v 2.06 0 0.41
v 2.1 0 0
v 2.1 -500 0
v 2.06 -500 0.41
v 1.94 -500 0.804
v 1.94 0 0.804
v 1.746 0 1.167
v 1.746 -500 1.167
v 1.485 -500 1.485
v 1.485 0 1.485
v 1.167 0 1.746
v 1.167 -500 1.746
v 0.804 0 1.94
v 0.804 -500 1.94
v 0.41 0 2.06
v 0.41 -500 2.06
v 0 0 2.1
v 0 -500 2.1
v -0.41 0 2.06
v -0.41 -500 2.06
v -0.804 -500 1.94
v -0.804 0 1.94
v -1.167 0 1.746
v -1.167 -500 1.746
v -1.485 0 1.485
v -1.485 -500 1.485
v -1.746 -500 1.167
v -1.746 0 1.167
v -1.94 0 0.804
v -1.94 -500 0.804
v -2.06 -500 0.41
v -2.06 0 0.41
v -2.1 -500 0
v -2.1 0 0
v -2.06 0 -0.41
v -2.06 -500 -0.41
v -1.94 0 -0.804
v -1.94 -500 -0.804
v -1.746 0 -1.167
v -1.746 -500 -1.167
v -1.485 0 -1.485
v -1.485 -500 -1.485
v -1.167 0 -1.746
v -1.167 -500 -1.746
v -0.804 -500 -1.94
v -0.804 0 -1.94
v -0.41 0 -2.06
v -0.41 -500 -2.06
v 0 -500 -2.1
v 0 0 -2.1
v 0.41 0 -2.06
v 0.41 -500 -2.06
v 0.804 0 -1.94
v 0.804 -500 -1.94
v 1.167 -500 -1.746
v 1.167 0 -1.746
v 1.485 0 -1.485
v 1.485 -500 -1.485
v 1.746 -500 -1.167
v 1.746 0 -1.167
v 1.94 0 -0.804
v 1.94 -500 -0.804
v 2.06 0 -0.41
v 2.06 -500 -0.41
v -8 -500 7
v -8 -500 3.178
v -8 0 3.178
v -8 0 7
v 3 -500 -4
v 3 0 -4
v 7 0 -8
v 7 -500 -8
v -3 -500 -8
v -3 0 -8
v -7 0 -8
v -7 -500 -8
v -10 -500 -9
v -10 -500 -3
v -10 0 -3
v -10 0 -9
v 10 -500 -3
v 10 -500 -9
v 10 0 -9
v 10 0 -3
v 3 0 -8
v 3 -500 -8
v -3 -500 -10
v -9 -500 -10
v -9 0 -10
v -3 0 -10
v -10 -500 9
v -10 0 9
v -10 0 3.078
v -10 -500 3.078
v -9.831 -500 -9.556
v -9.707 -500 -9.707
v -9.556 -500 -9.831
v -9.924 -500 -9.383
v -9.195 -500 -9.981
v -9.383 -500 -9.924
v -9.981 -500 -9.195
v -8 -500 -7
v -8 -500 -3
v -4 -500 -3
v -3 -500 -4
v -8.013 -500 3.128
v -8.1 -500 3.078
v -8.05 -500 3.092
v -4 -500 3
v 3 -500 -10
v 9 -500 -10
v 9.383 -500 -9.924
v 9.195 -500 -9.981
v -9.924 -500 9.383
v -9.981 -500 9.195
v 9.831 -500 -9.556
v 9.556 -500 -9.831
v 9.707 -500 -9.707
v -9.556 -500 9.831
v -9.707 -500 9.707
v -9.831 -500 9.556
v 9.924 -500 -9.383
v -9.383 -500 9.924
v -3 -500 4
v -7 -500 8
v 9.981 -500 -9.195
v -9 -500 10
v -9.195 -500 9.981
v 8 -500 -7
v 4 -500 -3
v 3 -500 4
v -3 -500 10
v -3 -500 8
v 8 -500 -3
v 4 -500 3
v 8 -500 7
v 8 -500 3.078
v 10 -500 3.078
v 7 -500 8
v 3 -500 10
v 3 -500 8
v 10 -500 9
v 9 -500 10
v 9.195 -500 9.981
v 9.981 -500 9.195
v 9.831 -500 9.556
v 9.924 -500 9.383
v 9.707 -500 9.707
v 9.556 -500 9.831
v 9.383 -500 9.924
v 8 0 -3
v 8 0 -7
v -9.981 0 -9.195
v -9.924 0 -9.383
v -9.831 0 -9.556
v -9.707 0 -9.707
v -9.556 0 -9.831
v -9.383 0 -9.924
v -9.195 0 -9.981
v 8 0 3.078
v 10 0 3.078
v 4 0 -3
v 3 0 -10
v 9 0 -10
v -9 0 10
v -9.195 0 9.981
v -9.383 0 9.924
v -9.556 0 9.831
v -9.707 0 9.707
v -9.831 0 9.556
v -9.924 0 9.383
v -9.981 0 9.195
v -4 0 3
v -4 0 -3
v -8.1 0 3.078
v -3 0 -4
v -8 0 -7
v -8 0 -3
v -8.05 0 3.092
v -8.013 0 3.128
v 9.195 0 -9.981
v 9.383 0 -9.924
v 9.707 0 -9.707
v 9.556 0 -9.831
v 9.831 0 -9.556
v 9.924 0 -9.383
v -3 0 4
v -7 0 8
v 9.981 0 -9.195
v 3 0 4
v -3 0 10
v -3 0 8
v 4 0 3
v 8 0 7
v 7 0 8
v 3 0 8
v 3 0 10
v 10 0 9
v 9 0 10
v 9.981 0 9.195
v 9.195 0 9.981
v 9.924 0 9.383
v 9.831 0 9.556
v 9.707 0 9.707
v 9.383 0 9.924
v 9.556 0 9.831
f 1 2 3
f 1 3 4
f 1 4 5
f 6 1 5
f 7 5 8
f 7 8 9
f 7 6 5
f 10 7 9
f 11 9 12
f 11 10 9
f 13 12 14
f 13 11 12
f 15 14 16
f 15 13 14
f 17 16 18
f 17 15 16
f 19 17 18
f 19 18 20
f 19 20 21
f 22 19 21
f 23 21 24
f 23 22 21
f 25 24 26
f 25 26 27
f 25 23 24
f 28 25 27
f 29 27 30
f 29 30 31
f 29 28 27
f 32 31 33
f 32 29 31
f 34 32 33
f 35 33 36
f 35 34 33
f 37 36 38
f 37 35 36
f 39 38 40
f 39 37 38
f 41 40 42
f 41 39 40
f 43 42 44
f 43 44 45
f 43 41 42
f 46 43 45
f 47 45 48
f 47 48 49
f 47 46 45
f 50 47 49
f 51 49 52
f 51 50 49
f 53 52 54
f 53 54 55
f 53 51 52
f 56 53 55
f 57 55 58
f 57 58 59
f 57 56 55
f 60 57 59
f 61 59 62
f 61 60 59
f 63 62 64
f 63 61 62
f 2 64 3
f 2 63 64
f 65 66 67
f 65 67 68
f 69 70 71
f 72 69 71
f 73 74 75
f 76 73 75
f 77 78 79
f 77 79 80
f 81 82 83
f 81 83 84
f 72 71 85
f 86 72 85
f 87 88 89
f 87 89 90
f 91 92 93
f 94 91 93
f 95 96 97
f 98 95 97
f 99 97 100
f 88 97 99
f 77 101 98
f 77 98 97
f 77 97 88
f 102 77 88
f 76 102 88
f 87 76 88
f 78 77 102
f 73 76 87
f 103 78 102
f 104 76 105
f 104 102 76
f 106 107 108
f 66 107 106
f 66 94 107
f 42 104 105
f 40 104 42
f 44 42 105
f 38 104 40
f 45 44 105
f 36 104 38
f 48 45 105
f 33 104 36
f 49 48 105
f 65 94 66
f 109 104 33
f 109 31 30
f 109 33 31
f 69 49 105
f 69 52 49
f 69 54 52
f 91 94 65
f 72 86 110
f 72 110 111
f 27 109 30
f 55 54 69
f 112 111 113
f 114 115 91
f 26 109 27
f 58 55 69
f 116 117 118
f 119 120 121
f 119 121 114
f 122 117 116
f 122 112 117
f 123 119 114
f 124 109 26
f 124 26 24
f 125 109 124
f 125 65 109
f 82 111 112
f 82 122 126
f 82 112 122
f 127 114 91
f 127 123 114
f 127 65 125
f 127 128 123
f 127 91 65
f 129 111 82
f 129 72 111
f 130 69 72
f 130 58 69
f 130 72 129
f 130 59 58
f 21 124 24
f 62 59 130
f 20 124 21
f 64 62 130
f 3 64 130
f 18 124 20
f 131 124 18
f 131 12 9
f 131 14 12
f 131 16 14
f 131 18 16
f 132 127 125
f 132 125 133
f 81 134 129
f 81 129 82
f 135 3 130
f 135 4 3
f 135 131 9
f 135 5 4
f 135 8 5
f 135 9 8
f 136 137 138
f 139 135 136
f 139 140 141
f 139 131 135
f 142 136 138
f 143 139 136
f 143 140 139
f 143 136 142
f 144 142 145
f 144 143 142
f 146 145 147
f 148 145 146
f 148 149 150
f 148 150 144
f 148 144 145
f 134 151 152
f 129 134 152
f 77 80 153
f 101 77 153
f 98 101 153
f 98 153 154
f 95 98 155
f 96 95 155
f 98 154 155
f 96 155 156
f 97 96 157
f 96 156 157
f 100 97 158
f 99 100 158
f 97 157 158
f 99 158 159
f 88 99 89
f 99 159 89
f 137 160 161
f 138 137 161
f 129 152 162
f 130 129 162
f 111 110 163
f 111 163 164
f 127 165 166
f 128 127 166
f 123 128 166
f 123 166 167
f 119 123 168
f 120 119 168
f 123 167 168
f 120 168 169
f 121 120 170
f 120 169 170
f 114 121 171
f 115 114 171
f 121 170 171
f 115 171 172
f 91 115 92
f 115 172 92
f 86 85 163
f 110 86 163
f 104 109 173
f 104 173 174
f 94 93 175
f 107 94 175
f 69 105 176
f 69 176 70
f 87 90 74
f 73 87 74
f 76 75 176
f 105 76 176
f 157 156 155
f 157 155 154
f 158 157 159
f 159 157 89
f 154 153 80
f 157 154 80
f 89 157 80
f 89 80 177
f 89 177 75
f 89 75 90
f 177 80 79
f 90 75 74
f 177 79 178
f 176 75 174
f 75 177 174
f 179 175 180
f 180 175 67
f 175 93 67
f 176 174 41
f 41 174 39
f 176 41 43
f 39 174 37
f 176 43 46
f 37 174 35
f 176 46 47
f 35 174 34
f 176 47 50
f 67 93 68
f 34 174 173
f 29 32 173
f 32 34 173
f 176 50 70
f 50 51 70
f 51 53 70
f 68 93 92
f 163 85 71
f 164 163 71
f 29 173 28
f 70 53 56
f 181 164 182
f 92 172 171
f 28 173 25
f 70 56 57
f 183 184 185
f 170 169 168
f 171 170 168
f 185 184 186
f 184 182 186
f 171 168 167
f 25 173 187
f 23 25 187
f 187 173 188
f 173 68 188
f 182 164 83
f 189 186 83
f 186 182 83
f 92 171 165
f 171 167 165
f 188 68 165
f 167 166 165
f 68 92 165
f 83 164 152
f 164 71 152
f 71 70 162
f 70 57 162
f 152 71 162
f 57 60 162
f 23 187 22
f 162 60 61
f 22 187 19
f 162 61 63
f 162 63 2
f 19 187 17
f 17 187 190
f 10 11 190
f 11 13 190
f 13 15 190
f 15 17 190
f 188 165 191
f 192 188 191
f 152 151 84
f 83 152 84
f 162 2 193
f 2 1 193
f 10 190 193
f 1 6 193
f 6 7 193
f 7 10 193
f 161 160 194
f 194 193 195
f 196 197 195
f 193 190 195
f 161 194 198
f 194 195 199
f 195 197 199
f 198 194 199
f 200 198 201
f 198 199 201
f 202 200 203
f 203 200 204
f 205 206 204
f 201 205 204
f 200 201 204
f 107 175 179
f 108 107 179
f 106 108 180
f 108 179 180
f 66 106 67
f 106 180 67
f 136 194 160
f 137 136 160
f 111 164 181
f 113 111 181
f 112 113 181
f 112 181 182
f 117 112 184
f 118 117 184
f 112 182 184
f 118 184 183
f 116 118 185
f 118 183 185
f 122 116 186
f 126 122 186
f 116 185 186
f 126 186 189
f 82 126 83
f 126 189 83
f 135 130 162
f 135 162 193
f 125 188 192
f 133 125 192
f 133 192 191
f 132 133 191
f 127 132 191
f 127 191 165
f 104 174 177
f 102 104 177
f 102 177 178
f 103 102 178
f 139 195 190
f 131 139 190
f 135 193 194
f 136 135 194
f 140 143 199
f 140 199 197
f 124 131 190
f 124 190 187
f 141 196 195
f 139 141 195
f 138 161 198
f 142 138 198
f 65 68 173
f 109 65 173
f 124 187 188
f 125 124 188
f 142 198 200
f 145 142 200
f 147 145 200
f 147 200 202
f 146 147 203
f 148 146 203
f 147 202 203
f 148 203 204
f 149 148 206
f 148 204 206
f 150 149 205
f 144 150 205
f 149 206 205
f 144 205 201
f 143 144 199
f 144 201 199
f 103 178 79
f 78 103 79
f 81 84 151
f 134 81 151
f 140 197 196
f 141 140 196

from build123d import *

# Parameters (mm, degrees)
F0_R     = 2.1
F2_DEPTH = 500


with BuildPart() as f2:
    # F0 (on Front) → F2 (new body)
    with BuildSketch(Plane.XZ):
        with BuildLine():
            ThreePointArc((-10, -9), (-9.7071067812, -9.7071067812), (-9, -10))
            Line((-9, -10), (-3, -10))
            Line((-3, -10), (-3, -8))
            Line((-3, -8), (-7, -8))
            Line((-7, -8), (-3, -4))
            Line((-3, -4), (3, -4))
            Line((3, -4), (7, -8))
            Line((7, -8), (3, -8))
            Line((3, -8), (3, -10))
            Line((3, -10), (9, -10))
            ThreePointArc((9, -10), (9.7071067812, -9.7071067812), (10, -9))
            Line((10, -9), (10, -3))
            Line((10, -3), (8, -3))
            Line((8, -3), (8, -7))
            Line((8, -7), (4, -3))
            Line((4, -3), (4, 3))
            Line((4, 3), (8, 7))
            Line((8, 7), (8, 3.0783633339))
            Line((8, 3.0783633339), (10, 3.0783633339))
            Line((10, 3.0783633339), (10, 9))
            ThreePointArc((10, 9), (9.7071067812, 9.7071067812), (9, 10))
            Line((9, 10), (3, 10))
            Line((3, 10), (3, 8))
            Line((3, 8), (7, 8))
            Line((7, 8), (3, 4))
            Line((3, 4), (-3, 4))
            Line((-3, 4), (-7, 8))
            Line((-7, 8), (-3, 8))
            Line((-3, 8), (-3, 10))
            Line((-3, 10), (-9, 10))
            ThreePointArc((-9, 10), (-9.7071067812, 9.7071067812), (-10, 9))
            Line((-10, 9), (-10, 3.0783633339))
            Line((-10, 3.0783633339), (-8.1, 3.0783633339))
            ThreePointArc((-8.1, 3.0783633339), (-8.0292893219, 3.1076526558), (-8, 3.1783633339))
            Line((-8, 3.1783633339), (-8, 7))
            Line((-8, 7), (-4, 3))
            Line((-4, 3), (-4, -3))
            Line((-4, -3), (-8, -7))
            Line((-8, -7), (-8, -3))
            Line((-8, -3), (-10, -3))
            Line((-10, -3), (-10, -9))
        make_face()
        Circle(F0_R, mode=Mode.SUBTRACT)
    extrude(amount=F2_DEPTH)


solid = f2.part
